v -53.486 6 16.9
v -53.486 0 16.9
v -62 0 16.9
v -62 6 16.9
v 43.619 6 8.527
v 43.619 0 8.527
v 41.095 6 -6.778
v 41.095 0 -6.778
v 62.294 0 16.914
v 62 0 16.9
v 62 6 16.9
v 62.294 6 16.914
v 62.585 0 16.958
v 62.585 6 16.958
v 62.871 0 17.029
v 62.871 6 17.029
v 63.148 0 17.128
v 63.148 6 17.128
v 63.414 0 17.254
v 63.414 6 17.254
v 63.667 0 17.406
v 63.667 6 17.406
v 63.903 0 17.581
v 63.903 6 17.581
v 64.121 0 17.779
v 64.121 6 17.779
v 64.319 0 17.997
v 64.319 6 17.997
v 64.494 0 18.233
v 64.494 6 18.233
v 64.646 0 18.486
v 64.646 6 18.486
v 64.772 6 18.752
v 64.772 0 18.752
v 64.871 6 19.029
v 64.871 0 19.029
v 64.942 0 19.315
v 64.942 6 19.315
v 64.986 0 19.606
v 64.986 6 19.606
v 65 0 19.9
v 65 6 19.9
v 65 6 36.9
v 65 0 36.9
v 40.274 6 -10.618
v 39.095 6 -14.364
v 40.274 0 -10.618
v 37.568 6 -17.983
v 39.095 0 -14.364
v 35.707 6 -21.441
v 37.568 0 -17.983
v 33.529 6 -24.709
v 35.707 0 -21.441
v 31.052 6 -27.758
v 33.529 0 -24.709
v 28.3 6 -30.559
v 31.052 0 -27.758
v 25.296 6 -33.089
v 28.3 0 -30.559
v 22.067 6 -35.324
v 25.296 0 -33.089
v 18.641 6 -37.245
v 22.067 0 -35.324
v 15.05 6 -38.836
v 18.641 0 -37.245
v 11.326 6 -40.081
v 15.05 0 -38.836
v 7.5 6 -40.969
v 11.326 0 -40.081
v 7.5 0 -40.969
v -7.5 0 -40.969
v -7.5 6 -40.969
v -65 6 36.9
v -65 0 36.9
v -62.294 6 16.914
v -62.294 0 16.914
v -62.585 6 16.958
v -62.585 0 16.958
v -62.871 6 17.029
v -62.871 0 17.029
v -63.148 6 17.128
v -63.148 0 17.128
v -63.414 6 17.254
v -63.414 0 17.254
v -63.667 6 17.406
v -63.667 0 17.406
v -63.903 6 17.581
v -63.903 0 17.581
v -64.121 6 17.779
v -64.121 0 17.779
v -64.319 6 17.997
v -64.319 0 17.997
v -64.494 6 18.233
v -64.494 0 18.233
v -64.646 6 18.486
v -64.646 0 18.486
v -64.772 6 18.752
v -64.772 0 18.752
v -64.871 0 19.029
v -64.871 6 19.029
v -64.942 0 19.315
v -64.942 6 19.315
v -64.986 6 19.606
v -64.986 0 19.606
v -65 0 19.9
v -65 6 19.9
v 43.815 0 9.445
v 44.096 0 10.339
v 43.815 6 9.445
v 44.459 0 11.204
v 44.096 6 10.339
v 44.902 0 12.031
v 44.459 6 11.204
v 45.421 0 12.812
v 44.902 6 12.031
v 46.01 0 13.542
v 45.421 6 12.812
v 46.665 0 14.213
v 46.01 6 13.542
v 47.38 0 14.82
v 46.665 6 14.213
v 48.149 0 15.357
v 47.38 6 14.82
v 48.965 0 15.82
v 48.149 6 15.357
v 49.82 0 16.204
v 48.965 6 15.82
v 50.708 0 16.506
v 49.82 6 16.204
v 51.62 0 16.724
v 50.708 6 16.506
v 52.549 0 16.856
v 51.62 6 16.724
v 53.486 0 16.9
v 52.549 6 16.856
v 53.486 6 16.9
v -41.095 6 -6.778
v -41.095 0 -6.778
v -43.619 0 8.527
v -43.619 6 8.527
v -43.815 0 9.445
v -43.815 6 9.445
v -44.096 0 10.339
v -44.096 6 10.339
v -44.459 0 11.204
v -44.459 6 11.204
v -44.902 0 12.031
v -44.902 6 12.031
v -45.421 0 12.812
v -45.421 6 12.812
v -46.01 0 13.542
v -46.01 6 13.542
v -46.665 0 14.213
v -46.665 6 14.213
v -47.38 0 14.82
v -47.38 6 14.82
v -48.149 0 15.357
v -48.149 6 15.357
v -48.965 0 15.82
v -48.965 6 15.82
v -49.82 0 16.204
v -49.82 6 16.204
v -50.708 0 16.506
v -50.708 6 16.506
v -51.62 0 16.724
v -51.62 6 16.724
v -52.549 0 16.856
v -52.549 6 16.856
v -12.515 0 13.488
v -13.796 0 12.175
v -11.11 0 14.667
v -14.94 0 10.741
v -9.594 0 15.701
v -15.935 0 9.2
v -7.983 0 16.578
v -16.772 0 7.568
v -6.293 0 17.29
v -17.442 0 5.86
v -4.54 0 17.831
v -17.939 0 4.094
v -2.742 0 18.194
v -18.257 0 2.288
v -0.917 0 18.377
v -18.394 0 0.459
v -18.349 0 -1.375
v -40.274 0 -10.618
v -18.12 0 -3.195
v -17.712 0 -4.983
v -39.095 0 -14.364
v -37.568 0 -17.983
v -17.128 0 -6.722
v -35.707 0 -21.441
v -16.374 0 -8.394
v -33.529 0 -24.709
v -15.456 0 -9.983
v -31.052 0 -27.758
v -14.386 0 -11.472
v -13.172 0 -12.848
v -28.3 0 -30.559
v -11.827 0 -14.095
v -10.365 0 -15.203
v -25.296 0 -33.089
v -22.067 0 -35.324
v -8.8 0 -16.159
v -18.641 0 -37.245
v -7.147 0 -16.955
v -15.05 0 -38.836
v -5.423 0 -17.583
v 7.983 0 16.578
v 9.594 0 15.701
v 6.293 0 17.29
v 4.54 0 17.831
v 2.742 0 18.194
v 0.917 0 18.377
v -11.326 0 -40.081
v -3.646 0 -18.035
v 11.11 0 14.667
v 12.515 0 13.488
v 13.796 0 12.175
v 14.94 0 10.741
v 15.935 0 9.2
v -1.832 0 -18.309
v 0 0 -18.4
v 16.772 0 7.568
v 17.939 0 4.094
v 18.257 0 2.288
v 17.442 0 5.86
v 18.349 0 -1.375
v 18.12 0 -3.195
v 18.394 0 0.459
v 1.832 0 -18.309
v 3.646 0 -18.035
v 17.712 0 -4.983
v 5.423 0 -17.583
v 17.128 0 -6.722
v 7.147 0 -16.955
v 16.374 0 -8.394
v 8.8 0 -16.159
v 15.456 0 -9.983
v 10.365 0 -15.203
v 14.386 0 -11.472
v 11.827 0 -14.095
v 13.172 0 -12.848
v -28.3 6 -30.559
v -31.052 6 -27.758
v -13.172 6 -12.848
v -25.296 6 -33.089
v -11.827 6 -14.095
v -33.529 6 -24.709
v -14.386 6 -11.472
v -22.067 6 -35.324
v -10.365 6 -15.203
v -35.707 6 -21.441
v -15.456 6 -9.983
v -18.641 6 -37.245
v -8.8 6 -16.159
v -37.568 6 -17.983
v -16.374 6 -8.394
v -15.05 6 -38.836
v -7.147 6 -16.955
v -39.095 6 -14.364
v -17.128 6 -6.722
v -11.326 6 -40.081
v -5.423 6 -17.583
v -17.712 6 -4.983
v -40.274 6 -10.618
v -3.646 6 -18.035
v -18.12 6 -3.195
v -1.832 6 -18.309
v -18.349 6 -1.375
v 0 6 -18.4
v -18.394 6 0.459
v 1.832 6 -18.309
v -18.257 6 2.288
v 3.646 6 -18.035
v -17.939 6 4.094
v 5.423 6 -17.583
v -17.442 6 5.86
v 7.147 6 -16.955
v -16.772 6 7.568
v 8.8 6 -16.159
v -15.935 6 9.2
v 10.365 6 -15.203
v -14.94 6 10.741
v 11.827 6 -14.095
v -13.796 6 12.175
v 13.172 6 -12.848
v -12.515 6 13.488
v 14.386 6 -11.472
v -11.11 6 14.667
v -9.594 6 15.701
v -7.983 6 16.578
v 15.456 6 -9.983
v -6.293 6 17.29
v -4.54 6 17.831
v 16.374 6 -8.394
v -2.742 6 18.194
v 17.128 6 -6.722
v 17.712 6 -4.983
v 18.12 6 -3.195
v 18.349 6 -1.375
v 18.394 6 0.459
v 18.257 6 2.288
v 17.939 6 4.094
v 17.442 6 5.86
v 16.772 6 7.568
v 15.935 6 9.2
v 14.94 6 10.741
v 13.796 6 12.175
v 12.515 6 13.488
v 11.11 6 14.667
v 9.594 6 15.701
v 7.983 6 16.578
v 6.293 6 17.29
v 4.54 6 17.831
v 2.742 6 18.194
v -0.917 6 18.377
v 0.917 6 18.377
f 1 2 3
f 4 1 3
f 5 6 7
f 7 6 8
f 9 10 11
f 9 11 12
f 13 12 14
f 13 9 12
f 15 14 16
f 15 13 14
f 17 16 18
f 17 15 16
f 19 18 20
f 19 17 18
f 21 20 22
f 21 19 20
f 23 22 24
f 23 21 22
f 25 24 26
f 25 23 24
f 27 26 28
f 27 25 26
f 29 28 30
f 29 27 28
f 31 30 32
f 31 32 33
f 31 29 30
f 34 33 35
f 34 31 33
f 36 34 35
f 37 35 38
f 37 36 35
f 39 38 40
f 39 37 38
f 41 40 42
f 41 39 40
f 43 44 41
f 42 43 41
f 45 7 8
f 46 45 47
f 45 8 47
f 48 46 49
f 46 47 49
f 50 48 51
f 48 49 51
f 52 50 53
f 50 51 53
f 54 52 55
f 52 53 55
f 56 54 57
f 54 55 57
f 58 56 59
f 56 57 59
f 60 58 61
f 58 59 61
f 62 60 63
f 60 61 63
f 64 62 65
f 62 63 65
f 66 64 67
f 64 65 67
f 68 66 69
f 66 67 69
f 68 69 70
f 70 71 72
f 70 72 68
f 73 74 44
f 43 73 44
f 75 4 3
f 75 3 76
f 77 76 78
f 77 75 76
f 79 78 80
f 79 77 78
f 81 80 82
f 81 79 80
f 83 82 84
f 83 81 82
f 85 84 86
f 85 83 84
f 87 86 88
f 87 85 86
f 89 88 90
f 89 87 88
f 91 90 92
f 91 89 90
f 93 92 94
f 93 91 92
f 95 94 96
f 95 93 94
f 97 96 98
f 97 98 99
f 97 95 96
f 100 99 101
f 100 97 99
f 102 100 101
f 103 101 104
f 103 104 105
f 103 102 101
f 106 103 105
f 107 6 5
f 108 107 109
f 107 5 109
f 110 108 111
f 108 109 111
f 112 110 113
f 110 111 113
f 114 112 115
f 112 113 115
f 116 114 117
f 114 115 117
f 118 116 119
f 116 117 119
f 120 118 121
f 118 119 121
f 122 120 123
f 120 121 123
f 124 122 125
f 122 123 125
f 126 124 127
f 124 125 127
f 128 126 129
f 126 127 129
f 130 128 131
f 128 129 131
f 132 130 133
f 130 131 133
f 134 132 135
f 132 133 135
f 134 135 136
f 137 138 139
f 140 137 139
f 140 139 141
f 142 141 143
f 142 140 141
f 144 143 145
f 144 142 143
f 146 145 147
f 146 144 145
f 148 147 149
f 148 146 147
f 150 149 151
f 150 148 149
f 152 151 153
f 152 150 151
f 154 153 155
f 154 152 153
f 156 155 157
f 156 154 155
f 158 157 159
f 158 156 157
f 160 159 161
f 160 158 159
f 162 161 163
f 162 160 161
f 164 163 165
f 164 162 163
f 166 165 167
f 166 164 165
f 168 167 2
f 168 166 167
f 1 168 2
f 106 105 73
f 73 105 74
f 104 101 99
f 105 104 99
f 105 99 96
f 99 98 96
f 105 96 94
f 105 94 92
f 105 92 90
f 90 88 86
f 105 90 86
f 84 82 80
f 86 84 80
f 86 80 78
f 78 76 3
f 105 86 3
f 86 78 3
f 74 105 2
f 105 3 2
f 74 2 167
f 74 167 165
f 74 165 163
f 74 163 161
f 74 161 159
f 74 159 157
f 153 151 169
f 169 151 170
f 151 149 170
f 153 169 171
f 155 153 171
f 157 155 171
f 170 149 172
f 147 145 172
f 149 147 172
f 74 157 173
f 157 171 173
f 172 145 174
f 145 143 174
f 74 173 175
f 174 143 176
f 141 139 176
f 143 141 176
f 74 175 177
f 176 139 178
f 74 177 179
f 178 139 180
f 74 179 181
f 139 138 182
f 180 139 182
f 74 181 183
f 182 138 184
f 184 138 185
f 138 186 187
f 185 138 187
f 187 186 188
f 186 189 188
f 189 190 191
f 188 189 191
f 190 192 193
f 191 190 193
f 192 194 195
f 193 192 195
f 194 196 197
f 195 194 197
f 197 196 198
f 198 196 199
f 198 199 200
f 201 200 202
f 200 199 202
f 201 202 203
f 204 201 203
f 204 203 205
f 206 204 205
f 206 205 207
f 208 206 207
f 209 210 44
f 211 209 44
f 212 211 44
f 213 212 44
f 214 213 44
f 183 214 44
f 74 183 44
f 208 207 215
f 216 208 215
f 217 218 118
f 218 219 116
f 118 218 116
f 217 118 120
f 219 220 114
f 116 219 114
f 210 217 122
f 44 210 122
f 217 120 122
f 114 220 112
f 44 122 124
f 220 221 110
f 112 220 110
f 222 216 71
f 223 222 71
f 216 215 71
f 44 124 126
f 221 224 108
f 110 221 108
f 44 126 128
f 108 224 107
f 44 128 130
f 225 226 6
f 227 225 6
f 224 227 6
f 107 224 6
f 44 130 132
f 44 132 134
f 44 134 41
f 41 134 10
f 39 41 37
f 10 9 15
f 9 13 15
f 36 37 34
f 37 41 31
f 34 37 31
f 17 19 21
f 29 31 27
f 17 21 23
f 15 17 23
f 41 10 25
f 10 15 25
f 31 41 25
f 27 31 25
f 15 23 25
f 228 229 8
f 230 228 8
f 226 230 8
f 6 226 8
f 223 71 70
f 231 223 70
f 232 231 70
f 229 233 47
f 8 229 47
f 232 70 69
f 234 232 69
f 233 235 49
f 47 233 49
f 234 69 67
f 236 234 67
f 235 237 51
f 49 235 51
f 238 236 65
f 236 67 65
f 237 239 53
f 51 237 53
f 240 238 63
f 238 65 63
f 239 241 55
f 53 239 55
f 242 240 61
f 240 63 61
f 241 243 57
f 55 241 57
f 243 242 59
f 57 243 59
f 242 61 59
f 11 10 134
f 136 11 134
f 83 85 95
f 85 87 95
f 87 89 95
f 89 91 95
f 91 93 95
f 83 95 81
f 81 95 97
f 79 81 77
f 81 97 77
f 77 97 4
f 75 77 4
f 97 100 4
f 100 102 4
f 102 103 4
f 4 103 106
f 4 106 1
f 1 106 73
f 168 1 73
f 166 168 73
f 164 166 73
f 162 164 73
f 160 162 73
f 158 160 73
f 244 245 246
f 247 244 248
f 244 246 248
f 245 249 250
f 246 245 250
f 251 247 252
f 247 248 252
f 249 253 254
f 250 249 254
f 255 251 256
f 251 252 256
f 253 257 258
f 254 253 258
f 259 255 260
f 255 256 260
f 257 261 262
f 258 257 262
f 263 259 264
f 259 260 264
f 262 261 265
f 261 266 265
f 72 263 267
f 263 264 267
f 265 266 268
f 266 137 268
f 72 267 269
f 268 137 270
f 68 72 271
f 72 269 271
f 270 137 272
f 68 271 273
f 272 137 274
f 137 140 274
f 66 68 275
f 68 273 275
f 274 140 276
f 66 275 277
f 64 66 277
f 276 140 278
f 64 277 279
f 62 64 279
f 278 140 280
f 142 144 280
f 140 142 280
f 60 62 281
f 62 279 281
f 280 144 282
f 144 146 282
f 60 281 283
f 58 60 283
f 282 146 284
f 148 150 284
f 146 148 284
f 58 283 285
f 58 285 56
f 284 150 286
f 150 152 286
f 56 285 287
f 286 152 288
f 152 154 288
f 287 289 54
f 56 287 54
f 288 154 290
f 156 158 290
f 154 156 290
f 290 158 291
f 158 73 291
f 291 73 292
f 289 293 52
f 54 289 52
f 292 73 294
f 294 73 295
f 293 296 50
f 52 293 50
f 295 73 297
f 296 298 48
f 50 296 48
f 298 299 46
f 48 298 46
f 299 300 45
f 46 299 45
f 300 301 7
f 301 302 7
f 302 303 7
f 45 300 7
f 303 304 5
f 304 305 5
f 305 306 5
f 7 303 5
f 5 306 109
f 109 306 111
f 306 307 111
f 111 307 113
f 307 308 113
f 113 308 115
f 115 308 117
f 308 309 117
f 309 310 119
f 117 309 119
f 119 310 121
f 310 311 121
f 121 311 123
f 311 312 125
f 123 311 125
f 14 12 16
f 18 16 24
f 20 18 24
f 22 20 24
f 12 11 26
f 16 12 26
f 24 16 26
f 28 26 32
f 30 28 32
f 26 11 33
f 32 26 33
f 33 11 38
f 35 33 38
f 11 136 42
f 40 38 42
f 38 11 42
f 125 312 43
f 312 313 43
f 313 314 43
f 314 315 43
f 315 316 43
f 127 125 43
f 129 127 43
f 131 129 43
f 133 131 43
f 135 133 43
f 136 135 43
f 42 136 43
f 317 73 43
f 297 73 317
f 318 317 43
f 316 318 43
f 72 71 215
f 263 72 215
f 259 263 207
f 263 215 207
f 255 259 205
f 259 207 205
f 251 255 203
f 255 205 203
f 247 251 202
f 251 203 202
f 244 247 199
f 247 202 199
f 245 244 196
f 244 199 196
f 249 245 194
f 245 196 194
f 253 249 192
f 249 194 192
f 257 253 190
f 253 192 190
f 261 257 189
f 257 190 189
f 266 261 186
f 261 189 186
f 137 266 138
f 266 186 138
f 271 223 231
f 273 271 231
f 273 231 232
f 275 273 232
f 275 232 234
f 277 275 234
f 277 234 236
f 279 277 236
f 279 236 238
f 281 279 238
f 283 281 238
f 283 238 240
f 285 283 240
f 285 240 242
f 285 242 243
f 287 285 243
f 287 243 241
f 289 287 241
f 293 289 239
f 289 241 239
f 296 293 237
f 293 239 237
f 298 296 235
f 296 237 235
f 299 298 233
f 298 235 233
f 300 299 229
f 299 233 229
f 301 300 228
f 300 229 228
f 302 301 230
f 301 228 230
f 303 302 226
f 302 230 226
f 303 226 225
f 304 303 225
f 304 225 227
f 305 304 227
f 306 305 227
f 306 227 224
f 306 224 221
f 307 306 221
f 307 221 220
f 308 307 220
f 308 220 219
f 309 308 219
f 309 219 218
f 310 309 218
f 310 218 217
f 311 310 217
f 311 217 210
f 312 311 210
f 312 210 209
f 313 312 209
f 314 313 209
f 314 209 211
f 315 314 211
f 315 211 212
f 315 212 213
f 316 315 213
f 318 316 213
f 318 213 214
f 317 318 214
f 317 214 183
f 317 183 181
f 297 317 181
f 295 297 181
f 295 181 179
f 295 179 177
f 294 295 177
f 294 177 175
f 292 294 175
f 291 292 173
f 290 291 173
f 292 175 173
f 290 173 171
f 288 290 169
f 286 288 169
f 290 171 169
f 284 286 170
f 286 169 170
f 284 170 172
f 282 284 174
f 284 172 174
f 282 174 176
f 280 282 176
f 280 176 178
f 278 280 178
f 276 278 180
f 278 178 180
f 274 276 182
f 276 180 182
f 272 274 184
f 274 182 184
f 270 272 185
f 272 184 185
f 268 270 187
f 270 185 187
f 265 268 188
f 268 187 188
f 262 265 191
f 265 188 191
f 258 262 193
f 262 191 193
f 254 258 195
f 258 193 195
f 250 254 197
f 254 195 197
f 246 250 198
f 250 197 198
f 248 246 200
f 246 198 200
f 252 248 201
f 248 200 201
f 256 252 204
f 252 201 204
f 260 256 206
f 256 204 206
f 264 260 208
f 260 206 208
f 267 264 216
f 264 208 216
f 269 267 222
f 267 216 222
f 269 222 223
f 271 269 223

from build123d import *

# Parameters (mm, degrees)
SKETCH1_R           = 20.9
BOSS_EXTRUDE1_DEPTH = 30
SKETCH2_R           = 1
CUT_EXTRUDE1_DEPTH  = 3
SKETCH3_R           = 1
CUT_EXTRUDE2_DEPTH  = 3
SKETCH6_R           = 22.9
SKETCH6_R_2         = 18.4
BOSS_EXTRUDE2_DEPTH = 12
FILLET1_R           = 10
CHAMFER1_SIZE       = 2
SKETCH4_W           = 15
SKETCH4_H           = 3.988700157
CUT_EXTRUDE3_DEPTH  = 83.82344173
SKETCH8_R           = 1
CUT_EXTRUDE4_DEPTH  = 2
FILLET2_R           = 3
FILLET3_R           = 3
SKETCH9_W           = 164.009429166
SKETCH9_H           = 28.275732928
CUT_EXTRUDE5_DEPTH  = 93


with BuildPart() as part:
    # Sketch1 → Boss-Extrude1 (new body)
    with BuildSketch(Plane(origin=(0, 0, 0), x_dir=(1, 0, 0), z_dir=(0, 1, 0))):
        with BuildLine():
            Line((-41.094820281, 6.777775896), (-45, -16.9))
            Line((-45, -16.9), (-65, -16.9))
            Line((-65, -16.9), (-65, -36.9))
            Line((-65, -36.9), (65, -36.9))
            Line((65, -36.9), (65, -16.9))
            Line((65, -16.9), (45, -16.9))
            Line((45, -16.9), (41.094820281, 6.777775896))
            ThreePointArc((41.094820281, 6.777775896), (0, 41.65), (-41.094820281, 6.777775896))
        make_face()
        with Locations(Location((0, 0, 0), (0, 0, 270))):
            Circle(SKETCH1_R, mode=Mode.SUBTRACT)
    extrude(amount=BOSS_EXTRUDE1_DEPTH)

    # Sketch2 → Cut-Extrude1 (cut)
    with BuildSketch(Plane(origin=(0, 0, 16.9), x_dir=(-1, 0, 0), z_dir=(0, 0, -1))):
        with Locations((-55, 15)):
            Circle(SKETCH2_R)
    extrude(amount=-CUT_EXTRUDE1_DEPTH, mode=Mode.SUBTRACT)

    # Sketch3 → Cut-Extrude2 (cut)
    with BuildSketch(Plane(origin=(0, 0, 16.9), x_dir=(-1, 0, 0), z_dir=(0, 0, -1))):
        with Locations((55, 15)):
            Circle(SKETCH3_R)
    extrude(amount=-CUT_EXTRUDE2_DEPTH, mode=Mode.SUBTRACT)

    # Sketch6 → Boss-Extrude2 (add)
    with BuildSketch(Plane.XZ):
        Circle(SKETCH6_R)
        with Locations(Location((0, 0, 0), (0, 0, 270))):
            Circle(SKETCH6_R_2, mode=Mode.SUBTRACT)
    extrude(amount=-BOSS_EXTRUDE2_DEPTH)

    # Fillet1
    fillet1_edges = [part.edges().sort_by_distance(p)[0] for p in [
        (-45, 15, 16.9),
        (45, 15, 16.9),
    ]]
    fillet(fillet1_edges, radius=FILLET1_R)

    # Chamfer1
    chamfer1_edges = [part.edges().sort_by_distance(p)[0] for p in [
        (0, 30, -20.9),
    ]]
    chamfer(chamfer1_edges, length=CHAMFER1_SIZE)

    # Sketch4 → Cut-Extrude3 (cut, through all)
    with BuildSketch(Plane.XZ):
        with Locations((0, -42.963515313)):
            Rectangle(SKETCH4_W, SKETCH4_H)
    extrude(amount=-CUT_EXTRUDE3_DEPTH, mode=Mode.SUBTRACT)

    # Sketch8 → Cut-Extrude4 (cut)
    with BuildSketch(Plane(origin=(0, 0, -40.969165234), x_dir=(-1, 0, 0), z_dir=(0, 0, -1))):
        with Locations((0, 22)):
            Circle(SKETCH8_R)
    extrude(amount=-CUT_EXTRUDE4_DEPTH, mode=Mode.SUBTRACT)

    # Fillet2
    # the kernel refuses this fillet: 3 mm, written as the material it takes off along each edge
    with BuildSketch(Plane(origin=(83, 30, 16.9), x_dir=(0, 0, 1), z_dir=(-1, 0, 0)), Plane(origin=(-53.485795501, 30, 16.9), x_dir=(0, 0, 1), z_dir=(-1, 0, 0))) as fillet2_piece_1:
        with BuildLine():
            CenterArc((FILLET2_R, -FILLET2_R), FILLET2_R, 90, 90)
            Line((0, -FILLET2_R), (-FILLET2_R * 0.02, -FILLET2_R))
            Line((-FILLET2_R * 0.02, -FILLET2_R), (-FILLET2_R * 0.02, FILLET2_R * 0.02))
            Line((-FILLET2_R * 0.02, FILLET2_R * 0.02), (FILLET2_R, FILLET2_R * 0.02))
            Line((FILLET2_R, FILLET2_R * 0.02), (FILLET2_R, 0))
        make_face()
    extrude(amount=29.514204499, mode=Mode.SUBTRACT)
    with BuildSketch(Plane(origin=(53.485795501, 30, 6.9), x_dir=(-0.9866703548806417, 0, 0.1627317141792235), z_dir=(-0.1627317141792235, 0, -0.9866703548806417))) as fillet2_piece_2:
        with BuildLine():
            CenterArc((10 + FILLET2_R, -FILLET2_R), FILLET2_R, 90, 90)
            Line((10, -FILLET2_R), (10 - FILLET2_R * 0.02, -FILLET2_R))
            Line((10 - FILLET2_R * 0.02, -FILLET2_R), (10 - FILLET2_R * 0.02, FILLET2_R * 0.02))
            Line((10 - FILLET2_R * 0.02, FILLET2_R * 0.02), (10 + FILLET2_R, FILLET2_R * 0.02))
            Line((10 + FILLET2_R, FILLET2_R * 0.02), (10 + FILLET2_R, 0))
        make_face()
    revolve(axis=Axis((53.485795501, 30, 6.9), (0, 1, 0)), revolution_arc=80.6345096, mode=Mode.SUBTRACT)
    with BuildSketch(Plane(origin=(43.619091952, 30, 8.527317142), x_dir=(-0.9866703548806418, 0, 0.16273171417922358), z_dir=(-0.16273171417922358, 0, -0.9866703548806418)), Plane(origin=(-41.094820281, 30, -6.777775896), x_dir=(0.9866703548806418, 0, 0.16273171417922358), z_dir=(-0.16273171417922358, 0, 0.9866703548806418))) as fillet2_piece_3:
        with BuildLine():
            CenterArc((FILLET2_R, -FILLET2_R), FILLET2_R, 90, 90)
            Line((0, -FILLET2_R), (-FILLET2_R * 0.02, -FILLET2_R))
            Line((-FILLET2_R * 0.02, -FILLET2_R), (-FILLET2_R * 0.02, FILLET2_R * 0.02))
            Line((-FILLET2_R * 0.02, FILLET2_R * 0.02), (FILLET2_R, FILLET2_R * 0.02))
            Line((FILLET2_R, FILLET2_R * 0.02), (FILLET2_R, 0))
        make_face()
    extrude(amount=15.511860635, mode=Mode.SUBTRACT)
    with BuildSketch(Plane(origin=(-53.485795501, 30, 6.9), x_dir=(0.9866703548806417, 0, 0.1627317141792235), z_dir=(0.1627317141792235, 0, -0.9866703548806417))) as fillet2_piece_4:
        with BuildLine():
            CenterArc((10 + FILLET2_R, FILLET2_R), FILLET2_R, 180, 90)
            Line((10, FILLET2_R), (10 - FILLET2_R * 0.02, FILLET2_R))
            Line((10 - FILLET2_R * 0.02, FILLET2_R), (10 - FILLET2_R * 0.02, -FILLET2_R * 0.02))
            Line((10 - FILLET2_R * 0.02, -FILLET2_R * 0.02), (10 + FILLET2_R, -FILLET2_R * 0.02))
            Line((10 + FILLET2_R, -FILLET2_R * 0.02), (10 + FILLET2_R, 0))
        make_face()
    revolve(axis=Axis((-53.485795501, 30, 6.9), (0, -1, 0)), revolution_arc=80.6345096, mode=Mode.SUBTRACT)
    with BuildSketch(Plane(origin=(0, 30, 0), x_dir=(0.24858486581871286, 0, -0.9686101199584343), z_dir=(0.9686101199584343, 0, 0.24858486581871286))) as fillet2_piece_5:
        with BuildLine():
            CenterArc((41.65 - FILLET2_R, -FILLET2_R), FILLET2_R, 0, 90)
            Line((41.65, -FILLET2_R), (41.65 + FILLET2_R * 0.02, -FILLET2_R))
            Line((41.65 + FILLET2_R * 0.02, -FILLET2_R), (41.65 + FILLET2_R * 0.02, FILLET2_R * 0.02))
            Line((41.65 + FILLET2_R * 0.02, FILLET2_R * 0.02), (41.65 - FILLET2_R, FILLET2_R * 0.02))
            Line((41.65 - FILLET2_R, FILLET2_R * 0.02), (41.65 - FILLET2_R, 0))
        make_face()
    revolve(axis=Axis((0, 30, 0), (0, 1, 0)), revolution_arc=95.028297231, mode=Mode.SUBTRACT)
    with BuildSketch(Plane(origin=(0, 30, 0), x_dir=(0.9866703548806417, 0, -0.16273171417922386), z_dir=(0.16273171417922386, 0, 0.9866703548806417))) as fillet2_piece_6:
        with BuildLine():
            CenterArc((41.65 - FILLET2_R, -FILLET2_R), FILLET2_R, 0, 90)
            Line((41.65, -FILLET2_R), (41.65 + FILLET2_R * 0.02, -FILLET2_R))
            Line((41.65 + FILLET2_R * 0.02, -FILLET2_R), (41.65 + FILLET2_R * 0.02, FILLET2_R * 0.02))
            Line((41.65 + FILLET2_R * 0.02, FILLET2_R * 0.02), (41.65 - FILLET2_R, FILLET2_R * 0.02))
            Line((41.65 - FILLET2_R, FILLET2_R * 0.02), (41.65 - FILLET2_R, 0))
        make_face()
    revolve(axis=Axis((0, 30, 0), (0, 1, 0)), revolution_arc=95.028297231, mode=Mode.SUBTRACT)

    # Fillet3
    fillet3_edges = [part.edges().sort_by_distance(p)[0] for p in [
        (65, 30, 28.4),
        (-65, 30, 28.4),
        (65, 13.5, 16.9),
        (65, 29.121320344, 17.778679656),
        (-65, 13.5, 16.9),
        (-65, 29.121320344, 17.778679656),
    ]]
    fillet(fillet3_edges, radius=FILLET3_R)

    # Sketch9 → Cut-Extrude5 (cut)
    with BuildSketch(Plane.XY.offset(36.9)):
        with Locations((5.097067232, 20.137866464)):
            Rectangle(SKETCH9_W, SKETCH9_H)
    extrude(amount=-CUT_EXTRUDE5_DEPTH, mode=Mode.SUBTRACT)


solid = part.part
